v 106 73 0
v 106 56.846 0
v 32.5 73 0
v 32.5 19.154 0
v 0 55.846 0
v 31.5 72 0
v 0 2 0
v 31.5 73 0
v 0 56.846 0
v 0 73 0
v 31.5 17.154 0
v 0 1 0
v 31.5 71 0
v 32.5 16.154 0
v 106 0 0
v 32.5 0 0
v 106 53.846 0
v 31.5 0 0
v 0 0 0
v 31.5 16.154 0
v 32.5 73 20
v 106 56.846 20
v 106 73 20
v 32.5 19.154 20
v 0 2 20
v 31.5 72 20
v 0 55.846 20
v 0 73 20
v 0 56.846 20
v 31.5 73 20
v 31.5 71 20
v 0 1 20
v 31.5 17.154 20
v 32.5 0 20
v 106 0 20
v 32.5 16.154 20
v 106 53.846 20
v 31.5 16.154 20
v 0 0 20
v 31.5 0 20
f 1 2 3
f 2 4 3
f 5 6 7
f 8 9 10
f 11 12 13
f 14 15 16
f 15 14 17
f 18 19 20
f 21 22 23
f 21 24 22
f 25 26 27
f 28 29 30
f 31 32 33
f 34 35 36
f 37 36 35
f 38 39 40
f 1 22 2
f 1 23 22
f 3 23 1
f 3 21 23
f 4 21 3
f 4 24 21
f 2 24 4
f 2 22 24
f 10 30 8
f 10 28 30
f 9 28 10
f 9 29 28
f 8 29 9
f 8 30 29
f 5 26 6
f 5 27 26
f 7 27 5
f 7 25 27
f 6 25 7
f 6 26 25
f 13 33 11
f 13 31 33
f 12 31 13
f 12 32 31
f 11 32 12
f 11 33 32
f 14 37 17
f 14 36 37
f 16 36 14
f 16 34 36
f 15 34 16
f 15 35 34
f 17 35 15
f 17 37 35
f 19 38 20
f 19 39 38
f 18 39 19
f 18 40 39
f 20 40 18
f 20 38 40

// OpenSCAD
// file TraingleArea.scad
//This models consists of a three-part triangle. 
// Print out two sets to demonstrate the area of a triangle.
// (c) 2020 Rich Cameron, CC-BY
// measurements in mm

base = 105;
height = 70;
thickness = 20;
twosets = true;

top = base * 1.3; //This is the position of the highest point of the triangle

%translate([0, 0, .1]) square([base, height]);
%color([0, 1, 1, .1]) for(i = [0:base:top]) translate([-i, 0, .1]) polygon([[0, 0], [base, 0], [top, height]]);
#%translate([0, 0, .2]) intersection() {
	for(i = [0:base:top]) translate([-i, 0, 0]) polygon([[0, 0], [base, 0], [top, height]]);
	square([top % base, height]);
}
color([1, 0, 0, .1]) translate([0, 0, .1]) %square([top % base, height]);

//made triangles thicker for easier handling 
linear_extrude(thickness) for(j = twosets ? [0, 1] : [0]) translate(j * [(top % base), height + ceil(top / base) * 2 - 1, 0]) rotate(j * 180) {
	for(i = [0:base:top]) translate([0, i / base * 2, 0]) intersection() {
		translate([-i, 0, 0]) polygon([[0, 0], [base, 0], [top, height]]);
		square([top % base, height]);
	}
	
	for(i = [0:base:top]) translate([1 + j * -(base + 2), i / base * 2, 0]) intersection() {
		translate([-i, 0, 0]) polygon([[0, 0], [base, 0], [top, height]]);
		translate([top % base, 0, 0]) square([base - (top % base), height + ceil(top / base)]);
	}
}

echo((((base % base))));
